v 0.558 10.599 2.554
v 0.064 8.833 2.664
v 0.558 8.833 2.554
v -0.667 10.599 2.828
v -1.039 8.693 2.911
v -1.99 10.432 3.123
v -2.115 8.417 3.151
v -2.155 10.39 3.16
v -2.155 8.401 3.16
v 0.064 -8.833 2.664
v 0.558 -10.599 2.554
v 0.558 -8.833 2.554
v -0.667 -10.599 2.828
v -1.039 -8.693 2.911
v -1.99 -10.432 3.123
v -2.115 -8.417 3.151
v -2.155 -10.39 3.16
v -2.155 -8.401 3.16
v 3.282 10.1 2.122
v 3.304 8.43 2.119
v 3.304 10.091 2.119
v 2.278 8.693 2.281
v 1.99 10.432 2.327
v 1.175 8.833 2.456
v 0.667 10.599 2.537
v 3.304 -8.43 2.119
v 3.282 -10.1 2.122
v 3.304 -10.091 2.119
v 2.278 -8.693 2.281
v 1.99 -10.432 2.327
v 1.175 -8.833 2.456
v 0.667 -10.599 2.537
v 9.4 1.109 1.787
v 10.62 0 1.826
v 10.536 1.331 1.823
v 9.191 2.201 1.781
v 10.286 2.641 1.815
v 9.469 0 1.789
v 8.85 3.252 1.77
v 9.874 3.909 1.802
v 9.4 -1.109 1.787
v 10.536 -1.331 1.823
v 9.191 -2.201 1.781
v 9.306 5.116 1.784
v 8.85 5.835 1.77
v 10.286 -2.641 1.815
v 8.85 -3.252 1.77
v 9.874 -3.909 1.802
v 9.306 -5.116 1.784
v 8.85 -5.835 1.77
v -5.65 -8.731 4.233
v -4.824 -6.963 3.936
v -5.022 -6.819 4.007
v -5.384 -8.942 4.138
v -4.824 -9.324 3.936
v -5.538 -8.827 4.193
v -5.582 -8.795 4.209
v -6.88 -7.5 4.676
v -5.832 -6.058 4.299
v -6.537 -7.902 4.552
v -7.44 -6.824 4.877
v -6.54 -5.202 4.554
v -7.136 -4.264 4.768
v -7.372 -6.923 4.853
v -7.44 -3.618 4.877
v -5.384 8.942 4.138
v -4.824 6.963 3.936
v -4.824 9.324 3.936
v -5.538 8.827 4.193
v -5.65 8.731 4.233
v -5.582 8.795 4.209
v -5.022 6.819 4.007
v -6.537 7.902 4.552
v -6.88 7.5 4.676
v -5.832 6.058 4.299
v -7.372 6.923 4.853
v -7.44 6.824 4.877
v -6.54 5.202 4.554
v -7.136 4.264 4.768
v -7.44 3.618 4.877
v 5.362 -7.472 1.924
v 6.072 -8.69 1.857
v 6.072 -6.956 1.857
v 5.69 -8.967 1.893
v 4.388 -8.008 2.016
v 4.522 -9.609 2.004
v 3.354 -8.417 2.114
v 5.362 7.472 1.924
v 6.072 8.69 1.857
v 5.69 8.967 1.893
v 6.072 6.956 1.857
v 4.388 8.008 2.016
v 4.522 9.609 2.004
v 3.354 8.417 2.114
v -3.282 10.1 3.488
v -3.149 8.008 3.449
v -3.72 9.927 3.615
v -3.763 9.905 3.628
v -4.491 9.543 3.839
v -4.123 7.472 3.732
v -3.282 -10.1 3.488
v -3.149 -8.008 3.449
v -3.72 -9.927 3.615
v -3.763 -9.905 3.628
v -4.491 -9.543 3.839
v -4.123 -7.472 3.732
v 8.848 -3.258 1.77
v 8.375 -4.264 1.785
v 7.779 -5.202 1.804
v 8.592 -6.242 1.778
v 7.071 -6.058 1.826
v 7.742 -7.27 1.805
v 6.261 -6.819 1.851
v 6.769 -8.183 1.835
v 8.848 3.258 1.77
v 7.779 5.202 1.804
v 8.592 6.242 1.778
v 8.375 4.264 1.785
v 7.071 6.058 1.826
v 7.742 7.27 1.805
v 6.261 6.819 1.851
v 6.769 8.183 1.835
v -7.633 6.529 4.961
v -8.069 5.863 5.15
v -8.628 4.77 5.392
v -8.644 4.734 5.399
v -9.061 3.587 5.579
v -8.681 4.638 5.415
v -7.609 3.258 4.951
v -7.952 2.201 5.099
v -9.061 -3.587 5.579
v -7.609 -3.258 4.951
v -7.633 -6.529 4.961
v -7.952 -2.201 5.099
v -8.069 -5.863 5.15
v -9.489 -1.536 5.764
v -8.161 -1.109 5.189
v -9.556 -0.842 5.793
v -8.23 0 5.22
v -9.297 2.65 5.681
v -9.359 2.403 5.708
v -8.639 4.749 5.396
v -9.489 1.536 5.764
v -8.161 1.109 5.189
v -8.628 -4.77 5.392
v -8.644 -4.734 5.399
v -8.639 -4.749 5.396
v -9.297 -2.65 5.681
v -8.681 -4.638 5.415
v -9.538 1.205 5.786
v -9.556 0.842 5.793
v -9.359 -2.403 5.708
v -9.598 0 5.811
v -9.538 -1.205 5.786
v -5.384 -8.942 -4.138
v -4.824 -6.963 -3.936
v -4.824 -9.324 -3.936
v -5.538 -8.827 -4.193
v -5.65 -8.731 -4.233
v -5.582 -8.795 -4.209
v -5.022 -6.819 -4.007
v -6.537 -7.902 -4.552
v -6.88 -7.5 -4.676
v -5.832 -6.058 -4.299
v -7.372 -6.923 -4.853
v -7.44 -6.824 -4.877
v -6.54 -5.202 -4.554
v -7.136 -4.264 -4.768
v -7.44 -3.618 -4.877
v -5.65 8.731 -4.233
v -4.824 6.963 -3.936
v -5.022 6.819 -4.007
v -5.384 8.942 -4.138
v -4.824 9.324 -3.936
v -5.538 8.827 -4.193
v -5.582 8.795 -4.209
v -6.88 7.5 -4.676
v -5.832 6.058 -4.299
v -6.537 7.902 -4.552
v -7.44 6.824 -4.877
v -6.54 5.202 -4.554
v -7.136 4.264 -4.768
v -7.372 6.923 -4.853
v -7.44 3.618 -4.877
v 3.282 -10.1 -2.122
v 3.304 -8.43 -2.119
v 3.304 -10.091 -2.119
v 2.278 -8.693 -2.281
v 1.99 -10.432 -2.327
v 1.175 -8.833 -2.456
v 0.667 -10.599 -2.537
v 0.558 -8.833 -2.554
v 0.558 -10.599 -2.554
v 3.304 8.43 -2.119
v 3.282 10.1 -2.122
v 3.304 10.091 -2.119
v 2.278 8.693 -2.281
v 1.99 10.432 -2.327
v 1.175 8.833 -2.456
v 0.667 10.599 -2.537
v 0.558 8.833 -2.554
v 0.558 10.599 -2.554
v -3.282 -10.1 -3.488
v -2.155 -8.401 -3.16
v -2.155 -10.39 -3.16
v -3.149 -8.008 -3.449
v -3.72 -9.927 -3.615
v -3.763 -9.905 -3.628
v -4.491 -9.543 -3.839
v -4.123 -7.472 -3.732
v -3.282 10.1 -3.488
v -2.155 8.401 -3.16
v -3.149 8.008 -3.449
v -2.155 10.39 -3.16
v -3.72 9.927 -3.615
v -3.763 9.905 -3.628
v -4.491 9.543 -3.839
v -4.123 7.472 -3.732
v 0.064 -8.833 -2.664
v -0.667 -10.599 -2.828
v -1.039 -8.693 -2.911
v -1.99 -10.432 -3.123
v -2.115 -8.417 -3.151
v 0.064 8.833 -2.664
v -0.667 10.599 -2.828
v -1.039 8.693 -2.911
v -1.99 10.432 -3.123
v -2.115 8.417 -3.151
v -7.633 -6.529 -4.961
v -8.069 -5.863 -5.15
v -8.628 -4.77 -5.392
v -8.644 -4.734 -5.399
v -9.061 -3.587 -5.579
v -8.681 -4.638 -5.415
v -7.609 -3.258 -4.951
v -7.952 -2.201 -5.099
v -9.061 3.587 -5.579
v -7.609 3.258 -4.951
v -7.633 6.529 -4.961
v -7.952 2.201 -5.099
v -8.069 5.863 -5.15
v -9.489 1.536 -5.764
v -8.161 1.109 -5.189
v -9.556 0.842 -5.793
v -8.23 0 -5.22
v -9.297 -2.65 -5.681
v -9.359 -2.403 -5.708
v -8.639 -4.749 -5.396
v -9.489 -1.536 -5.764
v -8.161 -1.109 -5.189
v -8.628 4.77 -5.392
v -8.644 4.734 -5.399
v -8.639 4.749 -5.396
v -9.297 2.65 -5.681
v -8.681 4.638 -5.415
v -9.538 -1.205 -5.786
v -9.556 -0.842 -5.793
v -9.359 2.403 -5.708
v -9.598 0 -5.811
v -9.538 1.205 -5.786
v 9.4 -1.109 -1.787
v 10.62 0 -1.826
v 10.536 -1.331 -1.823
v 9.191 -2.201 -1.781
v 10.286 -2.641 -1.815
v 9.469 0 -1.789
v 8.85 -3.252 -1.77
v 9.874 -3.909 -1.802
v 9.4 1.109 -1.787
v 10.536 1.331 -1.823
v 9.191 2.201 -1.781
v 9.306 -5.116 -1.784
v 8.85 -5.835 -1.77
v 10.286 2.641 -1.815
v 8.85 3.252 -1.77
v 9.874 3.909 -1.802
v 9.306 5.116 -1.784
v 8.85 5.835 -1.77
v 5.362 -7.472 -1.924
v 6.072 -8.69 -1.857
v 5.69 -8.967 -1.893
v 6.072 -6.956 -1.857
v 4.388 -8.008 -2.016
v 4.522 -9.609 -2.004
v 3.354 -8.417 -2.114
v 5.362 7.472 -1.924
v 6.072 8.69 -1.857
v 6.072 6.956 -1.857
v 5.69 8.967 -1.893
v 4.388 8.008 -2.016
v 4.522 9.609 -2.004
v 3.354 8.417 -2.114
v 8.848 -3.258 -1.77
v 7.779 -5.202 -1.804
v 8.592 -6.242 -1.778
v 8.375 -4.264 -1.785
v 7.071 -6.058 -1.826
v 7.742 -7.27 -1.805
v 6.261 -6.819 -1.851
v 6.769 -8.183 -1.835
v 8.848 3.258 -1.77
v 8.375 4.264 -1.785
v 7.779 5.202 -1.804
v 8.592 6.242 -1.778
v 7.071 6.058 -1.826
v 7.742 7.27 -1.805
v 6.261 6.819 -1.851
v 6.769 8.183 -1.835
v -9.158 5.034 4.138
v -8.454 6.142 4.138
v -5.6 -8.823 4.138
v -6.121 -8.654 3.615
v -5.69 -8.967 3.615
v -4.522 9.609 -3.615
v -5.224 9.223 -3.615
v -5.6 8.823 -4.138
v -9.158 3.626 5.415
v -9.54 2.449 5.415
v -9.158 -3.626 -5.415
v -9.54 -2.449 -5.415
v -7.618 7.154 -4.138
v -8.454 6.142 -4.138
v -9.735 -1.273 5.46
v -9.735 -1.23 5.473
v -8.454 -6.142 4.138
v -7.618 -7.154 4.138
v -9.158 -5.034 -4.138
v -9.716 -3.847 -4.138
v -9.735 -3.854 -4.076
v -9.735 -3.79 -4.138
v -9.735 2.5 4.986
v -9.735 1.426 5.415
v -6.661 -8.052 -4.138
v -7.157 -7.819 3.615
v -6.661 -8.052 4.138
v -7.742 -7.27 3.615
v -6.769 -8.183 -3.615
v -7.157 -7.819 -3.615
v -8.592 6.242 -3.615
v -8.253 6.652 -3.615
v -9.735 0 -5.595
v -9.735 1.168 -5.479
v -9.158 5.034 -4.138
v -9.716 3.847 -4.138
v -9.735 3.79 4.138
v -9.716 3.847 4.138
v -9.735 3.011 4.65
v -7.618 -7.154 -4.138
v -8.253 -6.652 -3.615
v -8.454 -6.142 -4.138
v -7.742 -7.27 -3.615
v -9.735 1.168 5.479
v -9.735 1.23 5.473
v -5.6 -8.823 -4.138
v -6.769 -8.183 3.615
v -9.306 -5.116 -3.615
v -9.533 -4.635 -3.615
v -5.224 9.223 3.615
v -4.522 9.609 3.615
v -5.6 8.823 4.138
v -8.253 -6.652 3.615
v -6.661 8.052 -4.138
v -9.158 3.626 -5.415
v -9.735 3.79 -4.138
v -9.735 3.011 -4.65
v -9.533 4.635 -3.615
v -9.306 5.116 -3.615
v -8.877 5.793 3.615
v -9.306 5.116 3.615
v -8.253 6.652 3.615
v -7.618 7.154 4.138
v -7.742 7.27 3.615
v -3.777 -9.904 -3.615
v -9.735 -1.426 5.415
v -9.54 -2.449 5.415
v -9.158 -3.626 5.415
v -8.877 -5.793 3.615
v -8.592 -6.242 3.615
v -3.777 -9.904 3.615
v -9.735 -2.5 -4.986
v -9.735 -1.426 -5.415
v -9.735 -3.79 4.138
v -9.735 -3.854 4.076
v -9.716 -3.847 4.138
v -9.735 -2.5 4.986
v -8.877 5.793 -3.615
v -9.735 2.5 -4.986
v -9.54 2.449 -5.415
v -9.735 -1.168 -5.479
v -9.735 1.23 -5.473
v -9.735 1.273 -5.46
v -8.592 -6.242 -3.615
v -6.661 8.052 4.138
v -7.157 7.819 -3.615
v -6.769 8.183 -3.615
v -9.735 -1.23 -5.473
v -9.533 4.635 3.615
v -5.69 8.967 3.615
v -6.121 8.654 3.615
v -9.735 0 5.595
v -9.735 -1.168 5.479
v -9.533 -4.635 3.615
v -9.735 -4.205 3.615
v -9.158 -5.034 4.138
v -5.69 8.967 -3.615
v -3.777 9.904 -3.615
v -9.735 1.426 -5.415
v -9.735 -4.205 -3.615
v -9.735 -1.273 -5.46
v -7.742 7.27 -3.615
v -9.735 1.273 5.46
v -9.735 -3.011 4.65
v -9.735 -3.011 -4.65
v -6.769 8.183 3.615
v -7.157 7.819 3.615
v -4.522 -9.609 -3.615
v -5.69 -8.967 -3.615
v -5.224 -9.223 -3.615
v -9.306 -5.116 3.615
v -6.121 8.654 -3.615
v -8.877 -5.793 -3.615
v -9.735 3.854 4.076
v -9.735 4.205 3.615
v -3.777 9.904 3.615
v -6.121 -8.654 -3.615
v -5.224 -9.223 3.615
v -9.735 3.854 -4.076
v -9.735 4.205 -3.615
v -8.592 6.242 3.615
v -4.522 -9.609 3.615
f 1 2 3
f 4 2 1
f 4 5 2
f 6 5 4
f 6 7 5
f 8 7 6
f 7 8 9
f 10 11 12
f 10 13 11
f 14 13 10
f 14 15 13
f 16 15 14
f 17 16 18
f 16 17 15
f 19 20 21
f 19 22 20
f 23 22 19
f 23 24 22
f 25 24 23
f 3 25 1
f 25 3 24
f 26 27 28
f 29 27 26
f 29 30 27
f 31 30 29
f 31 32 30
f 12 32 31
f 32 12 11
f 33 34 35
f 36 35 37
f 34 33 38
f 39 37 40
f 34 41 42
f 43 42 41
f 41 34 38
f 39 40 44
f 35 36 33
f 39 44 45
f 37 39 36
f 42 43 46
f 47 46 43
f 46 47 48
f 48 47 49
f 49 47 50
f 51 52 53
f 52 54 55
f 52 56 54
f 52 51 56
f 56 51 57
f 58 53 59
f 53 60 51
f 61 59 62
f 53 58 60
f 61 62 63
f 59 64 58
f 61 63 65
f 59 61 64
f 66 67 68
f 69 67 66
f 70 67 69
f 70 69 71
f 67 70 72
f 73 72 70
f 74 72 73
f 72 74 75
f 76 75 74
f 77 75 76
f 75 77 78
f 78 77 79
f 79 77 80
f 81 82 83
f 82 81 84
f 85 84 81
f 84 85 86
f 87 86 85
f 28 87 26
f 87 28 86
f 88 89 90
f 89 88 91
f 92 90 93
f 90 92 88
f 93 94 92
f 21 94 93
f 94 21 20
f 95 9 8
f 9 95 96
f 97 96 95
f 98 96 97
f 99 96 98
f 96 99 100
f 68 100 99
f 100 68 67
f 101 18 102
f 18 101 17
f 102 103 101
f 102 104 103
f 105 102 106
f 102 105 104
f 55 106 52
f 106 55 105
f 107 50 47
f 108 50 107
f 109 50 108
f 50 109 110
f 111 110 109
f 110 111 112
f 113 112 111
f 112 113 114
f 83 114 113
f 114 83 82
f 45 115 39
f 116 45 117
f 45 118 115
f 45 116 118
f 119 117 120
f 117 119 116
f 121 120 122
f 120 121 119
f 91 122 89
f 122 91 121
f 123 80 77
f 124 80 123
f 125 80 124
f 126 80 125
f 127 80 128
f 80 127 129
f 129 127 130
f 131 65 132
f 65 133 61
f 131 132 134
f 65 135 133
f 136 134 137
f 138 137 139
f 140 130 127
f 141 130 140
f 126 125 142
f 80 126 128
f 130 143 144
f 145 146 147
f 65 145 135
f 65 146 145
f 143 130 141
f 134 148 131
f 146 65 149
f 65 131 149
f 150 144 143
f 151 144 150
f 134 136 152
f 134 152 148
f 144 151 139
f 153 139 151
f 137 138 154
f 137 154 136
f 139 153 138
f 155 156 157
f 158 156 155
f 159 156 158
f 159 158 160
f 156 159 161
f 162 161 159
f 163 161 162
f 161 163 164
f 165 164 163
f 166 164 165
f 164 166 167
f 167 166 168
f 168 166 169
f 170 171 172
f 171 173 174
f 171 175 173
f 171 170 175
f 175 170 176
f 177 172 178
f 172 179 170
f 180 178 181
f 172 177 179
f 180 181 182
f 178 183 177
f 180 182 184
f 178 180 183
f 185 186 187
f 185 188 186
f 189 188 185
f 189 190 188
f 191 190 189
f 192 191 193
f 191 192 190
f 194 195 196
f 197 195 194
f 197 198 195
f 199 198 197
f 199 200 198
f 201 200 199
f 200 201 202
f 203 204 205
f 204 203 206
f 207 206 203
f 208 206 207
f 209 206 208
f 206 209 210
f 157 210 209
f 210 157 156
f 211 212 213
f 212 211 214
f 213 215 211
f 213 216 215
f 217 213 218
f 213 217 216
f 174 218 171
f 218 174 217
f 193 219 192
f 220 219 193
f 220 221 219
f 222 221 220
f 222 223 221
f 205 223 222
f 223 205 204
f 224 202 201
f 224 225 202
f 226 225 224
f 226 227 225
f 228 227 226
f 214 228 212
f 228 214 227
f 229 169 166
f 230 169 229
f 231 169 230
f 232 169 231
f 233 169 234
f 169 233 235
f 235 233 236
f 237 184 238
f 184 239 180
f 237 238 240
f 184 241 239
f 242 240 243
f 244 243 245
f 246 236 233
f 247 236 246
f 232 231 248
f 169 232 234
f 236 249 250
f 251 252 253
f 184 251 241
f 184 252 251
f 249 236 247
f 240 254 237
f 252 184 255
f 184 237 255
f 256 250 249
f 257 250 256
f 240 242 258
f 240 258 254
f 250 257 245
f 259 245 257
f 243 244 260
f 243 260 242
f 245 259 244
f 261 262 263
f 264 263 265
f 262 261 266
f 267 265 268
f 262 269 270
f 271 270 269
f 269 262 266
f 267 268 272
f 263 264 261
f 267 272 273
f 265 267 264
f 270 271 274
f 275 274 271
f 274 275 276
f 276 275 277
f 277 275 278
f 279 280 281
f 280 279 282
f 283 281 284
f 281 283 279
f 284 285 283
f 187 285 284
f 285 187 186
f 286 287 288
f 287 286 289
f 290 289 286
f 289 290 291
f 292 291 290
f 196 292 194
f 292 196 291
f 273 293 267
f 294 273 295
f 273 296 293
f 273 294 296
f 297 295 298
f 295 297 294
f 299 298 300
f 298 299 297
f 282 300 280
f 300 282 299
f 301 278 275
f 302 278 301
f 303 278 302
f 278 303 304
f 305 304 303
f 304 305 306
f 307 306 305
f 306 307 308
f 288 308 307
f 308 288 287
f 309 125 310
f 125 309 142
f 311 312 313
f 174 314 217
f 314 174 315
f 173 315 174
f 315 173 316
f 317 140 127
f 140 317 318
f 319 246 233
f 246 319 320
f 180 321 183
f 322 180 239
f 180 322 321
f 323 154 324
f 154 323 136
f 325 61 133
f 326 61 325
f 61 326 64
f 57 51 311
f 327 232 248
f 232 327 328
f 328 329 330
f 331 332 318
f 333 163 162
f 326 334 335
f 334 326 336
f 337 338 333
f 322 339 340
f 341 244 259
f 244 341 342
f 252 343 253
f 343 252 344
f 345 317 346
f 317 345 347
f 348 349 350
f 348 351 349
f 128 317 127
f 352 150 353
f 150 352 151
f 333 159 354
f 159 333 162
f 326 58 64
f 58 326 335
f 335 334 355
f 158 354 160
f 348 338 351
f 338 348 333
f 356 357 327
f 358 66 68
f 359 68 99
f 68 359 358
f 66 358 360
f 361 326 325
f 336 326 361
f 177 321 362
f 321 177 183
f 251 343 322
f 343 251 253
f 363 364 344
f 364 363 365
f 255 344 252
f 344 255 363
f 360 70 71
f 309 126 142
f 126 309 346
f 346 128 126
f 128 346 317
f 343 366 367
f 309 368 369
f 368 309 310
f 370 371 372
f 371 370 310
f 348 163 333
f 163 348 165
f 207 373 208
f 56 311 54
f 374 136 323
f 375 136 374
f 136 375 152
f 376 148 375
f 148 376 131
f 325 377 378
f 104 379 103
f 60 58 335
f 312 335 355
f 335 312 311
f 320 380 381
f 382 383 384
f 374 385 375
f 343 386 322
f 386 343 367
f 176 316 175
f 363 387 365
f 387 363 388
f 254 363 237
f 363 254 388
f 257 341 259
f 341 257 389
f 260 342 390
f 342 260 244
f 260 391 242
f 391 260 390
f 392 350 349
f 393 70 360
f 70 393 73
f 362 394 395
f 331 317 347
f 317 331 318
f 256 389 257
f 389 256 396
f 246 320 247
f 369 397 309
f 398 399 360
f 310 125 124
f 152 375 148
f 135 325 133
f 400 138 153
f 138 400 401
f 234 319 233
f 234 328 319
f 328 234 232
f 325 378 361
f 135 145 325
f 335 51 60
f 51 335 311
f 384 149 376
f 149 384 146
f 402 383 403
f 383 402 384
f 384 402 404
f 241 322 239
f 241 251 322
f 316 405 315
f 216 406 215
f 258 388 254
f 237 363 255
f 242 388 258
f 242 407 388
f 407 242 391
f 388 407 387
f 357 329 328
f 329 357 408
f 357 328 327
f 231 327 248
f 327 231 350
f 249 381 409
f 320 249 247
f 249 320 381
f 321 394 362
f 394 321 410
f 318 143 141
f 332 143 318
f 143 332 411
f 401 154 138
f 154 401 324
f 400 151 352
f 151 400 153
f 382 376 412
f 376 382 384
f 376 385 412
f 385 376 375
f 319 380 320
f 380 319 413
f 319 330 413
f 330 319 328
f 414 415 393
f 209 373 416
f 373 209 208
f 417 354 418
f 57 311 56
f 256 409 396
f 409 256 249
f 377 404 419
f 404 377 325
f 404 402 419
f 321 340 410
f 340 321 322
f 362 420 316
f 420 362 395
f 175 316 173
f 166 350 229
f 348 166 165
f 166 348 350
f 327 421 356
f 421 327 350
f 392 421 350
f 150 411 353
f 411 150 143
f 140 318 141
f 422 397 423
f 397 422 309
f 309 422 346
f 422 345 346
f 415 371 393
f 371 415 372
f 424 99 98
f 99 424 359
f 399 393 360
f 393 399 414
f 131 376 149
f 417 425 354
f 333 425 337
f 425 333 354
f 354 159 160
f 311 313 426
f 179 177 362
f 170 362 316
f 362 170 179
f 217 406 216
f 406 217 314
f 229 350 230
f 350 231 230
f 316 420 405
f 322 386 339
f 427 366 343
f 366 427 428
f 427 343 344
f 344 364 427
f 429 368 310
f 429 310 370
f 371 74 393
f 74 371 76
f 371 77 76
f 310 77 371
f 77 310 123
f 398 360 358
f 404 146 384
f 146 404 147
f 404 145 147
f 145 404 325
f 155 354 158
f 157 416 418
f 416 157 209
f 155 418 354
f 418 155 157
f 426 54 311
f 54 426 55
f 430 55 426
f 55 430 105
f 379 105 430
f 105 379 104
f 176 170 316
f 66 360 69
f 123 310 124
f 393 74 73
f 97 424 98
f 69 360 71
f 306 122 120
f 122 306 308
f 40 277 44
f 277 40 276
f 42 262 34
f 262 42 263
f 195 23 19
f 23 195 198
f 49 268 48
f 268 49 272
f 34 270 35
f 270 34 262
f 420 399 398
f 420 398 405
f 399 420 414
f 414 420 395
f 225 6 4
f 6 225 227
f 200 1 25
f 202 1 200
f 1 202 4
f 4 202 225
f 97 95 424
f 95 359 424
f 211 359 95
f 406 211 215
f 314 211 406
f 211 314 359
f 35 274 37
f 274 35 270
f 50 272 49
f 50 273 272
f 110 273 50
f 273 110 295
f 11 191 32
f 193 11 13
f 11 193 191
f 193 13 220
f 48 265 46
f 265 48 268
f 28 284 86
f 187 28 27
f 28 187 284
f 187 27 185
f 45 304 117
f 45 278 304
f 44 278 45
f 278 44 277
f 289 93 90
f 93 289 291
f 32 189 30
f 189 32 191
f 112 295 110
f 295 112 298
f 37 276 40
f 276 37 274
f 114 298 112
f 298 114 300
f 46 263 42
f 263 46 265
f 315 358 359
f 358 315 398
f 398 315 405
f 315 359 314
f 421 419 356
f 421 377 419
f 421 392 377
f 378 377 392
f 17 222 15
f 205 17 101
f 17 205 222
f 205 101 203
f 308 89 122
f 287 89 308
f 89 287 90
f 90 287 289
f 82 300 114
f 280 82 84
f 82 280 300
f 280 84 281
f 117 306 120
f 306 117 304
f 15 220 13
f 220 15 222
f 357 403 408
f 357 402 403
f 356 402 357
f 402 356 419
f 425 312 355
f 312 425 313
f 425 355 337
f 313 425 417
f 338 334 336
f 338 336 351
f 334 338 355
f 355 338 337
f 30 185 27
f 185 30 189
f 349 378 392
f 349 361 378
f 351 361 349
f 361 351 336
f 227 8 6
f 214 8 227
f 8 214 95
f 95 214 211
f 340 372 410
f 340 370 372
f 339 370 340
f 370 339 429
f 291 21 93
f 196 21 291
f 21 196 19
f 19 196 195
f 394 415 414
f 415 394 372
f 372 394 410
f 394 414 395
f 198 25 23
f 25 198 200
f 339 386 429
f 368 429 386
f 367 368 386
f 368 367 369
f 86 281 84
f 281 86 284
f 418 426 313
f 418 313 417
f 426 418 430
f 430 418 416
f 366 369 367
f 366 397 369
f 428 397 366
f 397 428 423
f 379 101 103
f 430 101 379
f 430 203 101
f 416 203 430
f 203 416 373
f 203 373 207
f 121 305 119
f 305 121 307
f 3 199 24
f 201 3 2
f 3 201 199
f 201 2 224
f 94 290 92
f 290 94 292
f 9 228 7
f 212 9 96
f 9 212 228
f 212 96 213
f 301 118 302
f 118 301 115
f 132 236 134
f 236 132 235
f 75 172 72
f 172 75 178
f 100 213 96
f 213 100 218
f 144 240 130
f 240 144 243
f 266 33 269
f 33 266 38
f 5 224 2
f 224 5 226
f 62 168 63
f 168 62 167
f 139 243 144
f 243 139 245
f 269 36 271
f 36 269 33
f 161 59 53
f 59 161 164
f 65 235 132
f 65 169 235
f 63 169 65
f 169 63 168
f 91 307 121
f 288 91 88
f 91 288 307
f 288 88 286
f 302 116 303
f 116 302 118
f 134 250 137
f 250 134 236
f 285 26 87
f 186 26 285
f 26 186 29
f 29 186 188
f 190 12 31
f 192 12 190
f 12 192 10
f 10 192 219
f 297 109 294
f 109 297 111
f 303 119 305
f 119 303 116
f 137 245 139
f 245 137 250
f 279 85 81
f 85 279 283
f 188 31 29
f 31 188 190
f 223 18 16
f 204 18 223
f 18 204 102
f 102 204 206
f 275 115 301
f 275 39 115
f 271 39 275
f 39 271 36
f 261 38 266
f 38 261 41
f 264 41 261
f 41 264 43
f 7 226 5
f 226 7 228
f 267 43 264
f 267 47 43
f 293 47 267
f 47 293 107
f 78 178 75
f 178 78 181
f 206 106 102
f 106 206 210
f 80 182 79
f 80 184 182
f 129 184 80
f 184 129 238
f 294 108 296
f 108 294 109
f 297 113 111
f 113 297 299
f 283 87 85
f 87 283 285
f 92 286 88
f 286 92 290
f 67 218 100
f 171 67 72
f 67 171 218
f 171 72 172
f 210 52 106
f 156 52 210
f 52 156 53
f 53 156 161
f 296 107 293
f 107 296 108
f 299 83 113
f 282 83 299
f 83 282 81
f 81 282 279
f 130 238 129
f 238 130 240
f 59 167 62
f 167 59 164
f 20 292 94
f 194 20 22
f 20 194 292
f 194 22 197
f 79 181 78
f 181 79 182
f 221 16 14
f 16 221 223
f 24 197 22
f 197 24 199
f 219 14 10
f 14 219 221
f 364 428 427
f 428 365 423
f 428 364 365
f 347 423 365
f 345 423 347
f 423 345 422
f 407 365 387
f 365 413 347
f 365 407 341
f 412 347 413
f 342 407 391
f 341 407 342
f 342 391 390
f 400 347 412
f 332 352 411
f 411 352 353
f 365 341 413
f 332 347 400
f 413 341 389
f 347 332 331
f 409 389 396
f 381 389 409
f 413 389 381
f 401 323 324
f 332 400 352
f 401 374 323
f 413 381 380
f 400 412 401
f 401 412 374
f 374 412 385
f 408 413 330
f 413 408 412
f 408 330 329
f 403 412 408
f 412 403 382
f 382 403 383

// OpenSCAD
finger_size = 17.7; // [14:3,14.8:4,15.6:5,16.5:6,17.3:7,18.2:8,19:9,19.8:10,20.6:11,21.4:12,22.2:13]
cylinder_resolution = 50;


module innerCylinder() {
    translate([finger_size*0.035,0,0])
    cylinder(
        d=finger_size*1,
        h=finger_size,
        $fn = cylinder_resolution,
        center = true);
}

module swoopCutaway(){
    // The top swoop cutaway
    translate([finger_size*0.5,0,finger_size*2.6])
    rotate([90,0,0])
        cylinder(
            d=finger_size*5,
            h=finger_size*2,
            $fn = cylinder_resolution*2,
            center = true);
    // The bottom swoop cutaway
    translate([finger_size*0.5,0,-finger_size*2.6])
    rotate([90,0,0])
        cylinder(
            d=finger_size*5,
            h=finger_size*2,
            $fn = cylinder_resolution*2,
            center = true);
}

// Draw The Ring
difference() {
    
    // The outer cylinder
    cylinder(
        d=finger_size*1.2,
        h=finger_size,
        $fn = cylinder_resolution,
        center = true);
    
    // The inner Cylinder
    innerCylinder();
    
    swoopCutaway();
    
    // The rounding sphere cutaway
    difference() {
        sphere(
            r=finger_size*1,
            $fn = cylinder_resolution
        );
        sphere(
            r=finger_size*0.635,
            $fn = cylinder_resolution
        );
    }
    
    // The front plate cutaway
    translate([-finger_size*1.05,0,0])
        cube([finger_size,finger_size,finger_size],center=true);
}
